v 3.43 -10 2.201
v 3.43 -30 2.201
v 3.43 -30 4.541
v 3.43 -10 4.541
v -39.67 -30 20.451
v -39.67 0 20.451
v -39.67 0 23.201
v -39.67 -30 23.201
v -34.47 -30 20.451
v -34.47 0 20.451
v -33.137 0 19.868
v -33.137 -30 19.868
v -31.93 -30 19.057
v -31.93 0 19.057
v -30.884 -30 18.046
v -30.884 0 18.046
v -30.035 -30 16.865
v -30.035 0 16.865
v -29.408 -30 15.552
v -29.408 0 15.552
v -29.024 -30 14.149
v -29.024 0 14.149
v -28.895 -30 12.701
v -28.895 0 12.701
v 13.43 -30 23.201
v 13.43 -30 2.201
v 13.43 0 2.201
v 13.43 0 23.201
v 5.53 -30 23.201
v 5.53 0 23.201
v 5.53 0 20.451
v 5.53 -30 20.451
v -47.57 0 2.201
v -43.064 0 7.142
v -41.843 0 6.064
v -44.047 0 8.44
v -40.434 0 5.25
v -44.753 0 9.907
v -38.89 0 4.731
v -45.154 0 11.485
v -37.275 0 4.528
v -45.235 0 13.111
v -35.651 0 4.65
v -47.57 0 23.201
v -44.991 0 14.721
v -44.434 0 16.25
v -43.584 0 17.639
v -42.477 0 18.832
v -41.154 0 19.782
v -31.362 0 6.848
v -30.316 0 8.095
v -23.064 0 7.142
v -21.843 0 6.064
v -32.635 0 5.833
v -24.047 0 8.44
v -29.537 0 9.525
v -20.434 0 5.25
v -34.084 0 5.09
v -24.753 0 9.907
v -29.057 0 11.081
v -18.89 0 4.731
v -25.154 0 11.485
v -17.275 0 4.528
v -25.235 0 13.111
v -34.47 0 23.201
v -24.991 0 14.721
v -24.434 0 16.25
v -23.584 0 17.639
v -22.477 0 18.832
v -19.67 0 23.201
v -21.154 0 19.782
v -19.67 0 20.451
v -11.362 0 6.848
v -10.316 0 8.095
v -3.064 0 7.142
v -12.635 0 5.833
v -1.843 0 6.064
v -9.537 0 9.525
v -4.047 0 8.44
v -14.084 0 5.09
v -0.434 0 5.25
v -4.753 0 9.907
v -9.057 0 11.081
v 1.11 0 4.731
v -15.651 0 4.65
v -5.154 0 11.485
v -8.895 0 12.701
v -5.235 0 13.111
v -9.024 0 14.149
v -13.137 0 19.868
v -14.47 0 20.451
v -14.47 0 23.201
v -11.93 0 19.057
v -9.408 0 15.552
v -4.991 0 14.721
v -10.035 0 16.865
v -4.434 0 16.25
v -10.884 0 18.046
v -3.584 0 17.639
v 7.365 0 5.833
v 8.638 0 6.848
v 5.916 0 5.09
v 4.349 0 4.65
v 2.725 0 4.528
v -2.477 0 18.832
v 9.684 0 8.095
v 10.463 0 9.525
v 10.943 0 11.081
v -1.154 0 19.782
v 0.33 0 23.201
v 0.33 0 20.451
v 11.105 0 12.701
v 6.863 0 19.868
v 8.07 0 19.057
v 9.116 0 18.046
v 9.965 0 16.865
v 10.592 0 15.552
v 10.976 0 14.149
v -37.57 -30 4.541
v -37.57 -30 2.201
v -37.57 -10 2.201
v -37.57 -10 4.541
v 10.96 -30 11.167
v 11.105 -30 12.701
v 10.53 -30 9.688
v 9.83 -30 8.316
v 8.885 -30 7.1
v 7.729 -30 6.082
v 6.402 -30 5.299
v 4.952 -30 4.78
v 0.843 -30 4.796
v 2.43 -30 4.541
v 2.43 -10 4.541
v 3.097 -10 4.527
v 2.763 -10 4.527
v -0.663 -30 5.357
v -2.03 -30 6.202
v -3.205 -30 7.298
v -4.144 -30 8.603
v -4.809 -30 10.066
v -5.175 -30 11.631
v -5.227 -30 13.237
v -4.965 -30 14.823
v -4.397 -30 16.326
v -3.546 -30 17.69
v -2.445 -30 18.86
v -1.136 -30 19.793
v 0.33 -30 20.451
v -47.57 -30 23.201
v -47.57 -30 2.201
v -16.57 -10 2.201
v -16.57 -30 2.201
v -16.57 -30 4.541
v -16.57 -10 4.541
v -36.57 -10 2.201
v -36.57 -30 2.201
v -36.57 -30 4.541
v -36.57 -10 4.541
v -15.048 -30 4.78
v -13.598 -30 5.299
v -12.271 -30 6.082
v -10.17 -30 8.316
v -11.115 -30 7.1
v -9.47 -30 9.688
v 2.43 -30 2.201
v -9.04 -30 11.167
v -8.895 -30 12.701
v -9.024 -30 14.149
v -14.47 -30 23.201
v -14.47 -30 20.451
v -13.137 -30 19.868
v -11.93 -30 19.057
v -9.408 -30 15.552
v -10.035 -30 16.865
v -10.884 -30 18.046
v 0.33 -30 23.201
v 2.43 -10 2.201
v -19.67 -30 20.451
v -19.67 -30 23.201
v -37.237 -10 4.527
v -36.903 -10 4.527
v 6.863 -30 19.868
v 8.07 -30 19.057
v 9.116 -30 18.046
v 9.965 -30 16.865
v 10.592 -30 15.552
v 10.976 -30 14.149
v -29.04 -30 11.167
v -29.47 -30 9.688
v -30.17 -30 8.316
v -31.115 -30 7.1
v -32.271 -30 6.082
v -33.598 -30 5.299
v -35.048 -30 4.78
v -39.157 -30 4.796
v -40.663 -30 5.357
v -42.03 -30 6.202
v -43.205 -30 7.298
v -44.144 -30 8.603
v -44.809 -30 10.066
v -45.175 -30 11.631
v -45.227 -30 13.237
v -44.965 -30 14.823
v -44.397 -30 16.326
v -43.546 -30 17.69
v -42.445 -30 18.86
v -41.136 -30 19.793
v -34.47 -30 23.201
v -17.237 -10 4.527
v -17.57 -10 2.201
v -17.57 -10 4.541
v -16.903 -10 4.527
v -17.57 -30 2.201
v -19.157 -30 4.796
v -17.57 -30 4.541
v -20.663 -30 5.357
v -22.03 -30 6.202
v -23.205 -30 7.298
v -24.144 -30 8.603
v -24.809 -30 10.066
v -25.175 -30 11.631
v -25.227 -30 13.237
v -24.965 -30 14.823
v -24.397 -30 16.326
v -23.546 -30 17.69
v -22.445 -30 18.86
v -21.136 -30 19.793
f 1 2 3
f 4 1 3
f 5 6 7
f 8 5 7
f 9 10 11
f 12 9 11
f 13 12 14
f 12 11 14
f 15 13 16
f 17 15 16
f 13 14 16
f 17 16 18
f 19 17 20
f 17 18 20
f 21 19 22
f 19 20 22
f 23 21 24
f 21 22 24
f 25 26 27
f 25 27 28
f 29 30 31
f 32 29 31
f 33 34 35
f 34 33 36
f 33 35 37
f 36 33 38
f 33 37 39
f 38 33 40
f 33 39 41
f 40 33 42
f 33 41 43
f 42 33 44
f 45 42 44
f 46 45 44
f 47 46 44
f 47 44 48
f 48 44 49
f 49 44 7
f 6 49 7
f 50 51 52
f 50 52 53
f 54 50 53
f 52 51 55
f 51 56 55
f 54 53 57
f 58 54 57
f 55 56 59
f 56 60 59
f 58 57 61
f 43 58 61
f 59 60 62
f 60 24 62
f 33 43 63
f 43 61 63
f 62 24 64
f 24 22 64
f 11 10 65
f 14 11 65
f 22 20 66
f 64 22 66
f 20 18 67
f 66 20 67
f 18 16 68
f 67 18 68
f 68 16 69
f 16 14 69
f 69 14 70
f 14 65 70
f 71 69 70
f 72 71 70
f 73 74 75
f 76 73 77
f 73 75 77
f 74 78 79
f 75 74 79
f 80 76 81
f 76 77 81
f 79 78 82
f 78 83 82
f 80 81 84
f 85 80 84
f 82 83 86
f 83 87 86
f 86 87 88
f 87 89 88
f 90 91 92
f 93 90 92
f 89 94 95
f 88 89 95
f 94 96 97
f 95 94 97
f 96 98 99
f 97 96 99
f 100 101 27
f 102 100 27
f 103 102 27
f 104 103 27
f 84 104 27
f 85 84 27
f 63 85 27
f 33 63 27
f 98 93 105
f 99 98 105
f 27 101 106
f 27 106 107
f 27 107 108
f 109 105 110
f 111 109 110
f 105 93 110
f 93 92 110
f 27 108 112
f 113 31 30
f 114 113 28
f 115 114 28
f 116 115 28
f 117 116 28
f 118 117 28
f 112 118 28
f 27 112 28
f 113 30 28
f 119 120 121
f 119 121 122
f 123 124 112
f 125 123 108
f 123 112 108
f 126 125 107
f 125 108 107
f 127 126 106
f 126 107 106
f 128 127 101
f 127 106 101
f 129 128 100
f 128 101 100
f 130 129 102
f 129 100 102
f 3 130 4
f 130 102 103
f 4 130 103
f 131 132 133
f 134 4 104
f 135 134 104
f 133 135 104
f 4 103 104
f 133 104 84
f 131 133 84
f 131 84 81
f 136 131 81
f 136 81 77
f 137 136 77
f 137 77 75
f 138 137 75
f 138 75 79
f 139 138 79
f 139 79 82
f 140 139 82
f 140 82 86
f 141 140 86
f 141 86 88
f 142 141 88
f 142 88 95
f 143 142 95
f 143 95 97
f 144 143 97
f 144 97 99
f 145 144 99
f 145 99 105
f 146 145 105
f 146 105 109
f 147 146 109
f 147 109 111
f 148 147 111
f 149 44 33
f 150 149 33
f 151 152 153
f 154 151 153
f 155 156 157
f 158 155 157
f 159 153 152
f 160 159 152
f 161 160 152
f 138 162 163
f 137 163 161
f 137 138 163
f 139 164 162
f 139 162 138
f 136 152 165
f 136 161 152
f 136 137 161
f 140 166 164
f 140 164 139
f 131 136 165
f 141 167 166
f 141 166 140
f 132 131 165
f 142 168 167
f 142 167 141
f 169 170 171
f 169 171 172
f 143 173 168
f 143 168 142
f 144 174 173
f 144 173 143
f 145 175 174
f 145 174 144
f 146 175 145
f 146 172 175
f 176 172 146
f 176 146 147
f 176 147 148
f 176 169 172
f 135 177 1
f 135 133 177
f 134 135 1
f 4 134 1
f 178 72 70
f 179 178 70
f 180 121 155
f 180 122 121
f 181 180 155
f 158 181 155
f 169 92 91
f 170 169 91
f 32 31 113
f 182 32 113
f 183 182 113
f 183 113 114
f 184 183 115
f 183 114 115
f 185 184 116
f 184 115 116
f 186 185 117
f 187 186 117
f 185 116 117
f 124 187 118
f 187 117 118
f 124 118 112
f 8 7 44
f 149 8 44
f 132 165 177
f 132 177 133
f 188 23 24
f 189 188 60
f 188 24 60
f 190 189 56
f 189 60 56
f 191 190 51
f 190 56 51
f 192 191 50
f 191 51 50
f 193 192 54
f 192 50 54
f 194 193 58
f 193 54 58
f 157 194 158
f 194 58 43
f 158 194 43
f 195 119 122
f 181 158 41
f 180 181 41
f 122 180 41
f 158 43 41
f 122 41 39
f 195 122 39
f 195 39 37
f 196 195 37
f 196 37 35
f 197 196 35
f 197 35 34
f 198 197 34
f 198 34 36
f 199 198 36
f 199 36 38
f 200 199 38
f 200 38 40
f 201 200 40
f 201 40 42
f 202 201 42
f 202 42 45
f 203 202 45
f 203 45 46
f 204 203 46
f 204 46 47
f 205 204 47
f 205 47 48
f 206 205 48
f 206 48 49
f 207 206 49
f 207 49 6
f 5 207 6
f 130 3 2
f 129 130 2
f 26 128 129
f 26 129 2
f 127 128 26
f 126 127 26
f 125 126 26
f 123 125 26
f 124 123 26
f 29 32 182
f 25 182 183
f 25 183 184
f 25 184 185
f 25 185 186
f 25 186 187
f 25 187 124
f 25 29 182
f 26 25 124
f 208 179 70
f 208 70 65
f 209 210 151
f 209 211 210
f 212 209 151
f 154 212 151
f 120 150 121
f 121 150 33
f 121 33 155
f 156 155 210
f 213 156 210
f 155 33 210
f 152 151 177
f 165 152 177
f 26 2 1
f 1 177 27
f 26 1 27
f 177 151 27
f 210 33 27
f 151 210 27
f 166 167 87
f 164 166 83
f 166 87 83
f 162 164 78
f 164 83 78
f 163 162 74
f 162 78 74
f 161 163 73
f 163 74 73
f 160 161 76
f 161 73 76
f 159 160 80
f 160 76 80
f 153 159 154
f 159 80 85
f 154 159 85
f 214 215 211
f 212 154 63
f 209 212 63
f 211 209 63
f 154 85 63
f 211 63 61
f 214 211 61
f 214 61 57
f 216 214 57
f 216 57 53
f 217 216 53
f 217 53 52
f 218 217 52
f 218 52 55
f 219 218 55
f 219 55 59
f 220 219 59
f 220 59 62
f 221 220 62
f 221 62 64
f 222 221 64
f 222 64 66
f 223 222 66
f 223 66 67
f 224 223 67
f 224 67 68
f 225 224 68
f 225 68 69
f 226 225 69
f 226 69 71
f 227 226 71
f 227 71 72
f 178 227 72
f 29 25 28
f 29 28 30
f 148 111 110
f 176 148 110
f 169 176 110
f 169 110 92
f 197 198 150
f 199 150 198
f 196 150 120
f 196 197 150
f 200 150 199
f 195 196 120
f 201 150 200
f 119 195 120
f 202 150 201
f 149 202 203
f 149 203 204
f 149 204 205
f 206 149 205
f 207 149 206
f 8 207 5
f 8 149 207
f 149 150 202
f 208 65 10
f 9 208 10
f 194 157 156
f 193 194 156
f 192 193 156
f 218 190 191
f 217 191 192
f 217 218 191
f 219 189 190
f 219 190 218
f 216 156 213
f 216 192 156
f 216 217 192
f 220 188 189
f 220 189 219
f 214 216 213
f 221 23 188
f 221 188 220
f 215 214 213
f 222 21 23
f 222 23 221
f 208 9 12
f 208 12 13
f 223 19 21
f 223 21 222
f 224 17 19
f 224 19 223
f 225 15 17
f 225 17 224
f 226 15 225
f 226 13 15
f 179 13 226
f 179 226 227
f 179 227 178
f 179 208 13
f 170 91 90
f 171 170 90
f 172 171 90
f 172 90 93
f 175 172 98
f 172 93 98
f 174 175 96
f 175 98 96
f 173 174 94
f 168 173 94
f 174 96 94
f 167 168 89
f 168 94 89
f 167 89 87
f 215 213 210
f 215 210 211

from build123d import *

# Parameters (mm, degrees)
F1_DEPTH = 30
F3_W     = 1
F3_H     = 2.340305
F4_DEPTH = 20


with BuildPart() as f1:
    # F0 (on Front) → F1 (new body)
    with BuildSketch(Plane.XZ):
        with BuildLine():
            Line((-39.669828, 23.200569), (-47.569828, 23.200569))
            Line((-47.569828, 23.200569), (-47.569828, 2.200569))
            Line((-47.569828, 2.200569), (13.430172, 2.200569))
            Line((13.430172, 2.200569), (13.430172, 23.200569))
            Line((13.430172, 23.200569), (5.530172, 23.200569))
            Line((5.530172, 23.200569), (5.530172, 20.451093))
            ThreePointArc((5.530172, 20.451093), (9.566648, 17.474227), (11.105172, 12.700569))
            ThreePointArc((11.105172, 12.700569), (-1.843486, 6.064093), (0.330172, 20.451093))
            Line((0.330172, 20.451093), (0.330172, 23.200569))
            Line((0.330172, 23.200569), (-14.469828, 23.200569))
            Line((-14.469828, 23.200569), (-14.469828, 20.451093))
            ThreePointArc((-14.469828, 20.451093), (-10.433352, 17.474227), (-8.894828, 12.700569))
            ThreePointArc((-8.894828, 12.700569), (-21.843486, 6.064093), (-19.669828, 20.451093))
            Line((-19.669828, 20.451093), (-19.669828, 23.200569))
            Line((-19.669828, 23.200569), (-34.469828, 23.200569))
            Line((-34.469828, 23.200569), (-34.469828, 20.451093))
            ThreePointArc((-34.469828, 20.451093), (-30.433352, 17.474227), (-28.894828, 12.700569))
            ThreePointArc((-28.894828, 12.700569), (-41.843486, 6.064093), (-39.669828, 20.451093))
            Line((-39.669828, 20.451093), (-39.669828, 23.200569))
        make_face()
    extrude(amount=F1_DEPTH)

    # F3 (on face) → F4 (cut)
    with BuildSketch(Plane.XZ.offset(30)):
        with Locations((-37.069828, 3.370721)):
            Rectangle(F3_W, F3_H)
        with Locations((-17.069828, 3.370721)):
            Rectangle(F3_W, F3_H)
        with Locations((2.930172, 3.370721)):
            Rectangle(F3_W, F3_H)
    extrude(amount=-F4_DEPTH, mode=Mode.SUBTRACT)


solid = f1.part
